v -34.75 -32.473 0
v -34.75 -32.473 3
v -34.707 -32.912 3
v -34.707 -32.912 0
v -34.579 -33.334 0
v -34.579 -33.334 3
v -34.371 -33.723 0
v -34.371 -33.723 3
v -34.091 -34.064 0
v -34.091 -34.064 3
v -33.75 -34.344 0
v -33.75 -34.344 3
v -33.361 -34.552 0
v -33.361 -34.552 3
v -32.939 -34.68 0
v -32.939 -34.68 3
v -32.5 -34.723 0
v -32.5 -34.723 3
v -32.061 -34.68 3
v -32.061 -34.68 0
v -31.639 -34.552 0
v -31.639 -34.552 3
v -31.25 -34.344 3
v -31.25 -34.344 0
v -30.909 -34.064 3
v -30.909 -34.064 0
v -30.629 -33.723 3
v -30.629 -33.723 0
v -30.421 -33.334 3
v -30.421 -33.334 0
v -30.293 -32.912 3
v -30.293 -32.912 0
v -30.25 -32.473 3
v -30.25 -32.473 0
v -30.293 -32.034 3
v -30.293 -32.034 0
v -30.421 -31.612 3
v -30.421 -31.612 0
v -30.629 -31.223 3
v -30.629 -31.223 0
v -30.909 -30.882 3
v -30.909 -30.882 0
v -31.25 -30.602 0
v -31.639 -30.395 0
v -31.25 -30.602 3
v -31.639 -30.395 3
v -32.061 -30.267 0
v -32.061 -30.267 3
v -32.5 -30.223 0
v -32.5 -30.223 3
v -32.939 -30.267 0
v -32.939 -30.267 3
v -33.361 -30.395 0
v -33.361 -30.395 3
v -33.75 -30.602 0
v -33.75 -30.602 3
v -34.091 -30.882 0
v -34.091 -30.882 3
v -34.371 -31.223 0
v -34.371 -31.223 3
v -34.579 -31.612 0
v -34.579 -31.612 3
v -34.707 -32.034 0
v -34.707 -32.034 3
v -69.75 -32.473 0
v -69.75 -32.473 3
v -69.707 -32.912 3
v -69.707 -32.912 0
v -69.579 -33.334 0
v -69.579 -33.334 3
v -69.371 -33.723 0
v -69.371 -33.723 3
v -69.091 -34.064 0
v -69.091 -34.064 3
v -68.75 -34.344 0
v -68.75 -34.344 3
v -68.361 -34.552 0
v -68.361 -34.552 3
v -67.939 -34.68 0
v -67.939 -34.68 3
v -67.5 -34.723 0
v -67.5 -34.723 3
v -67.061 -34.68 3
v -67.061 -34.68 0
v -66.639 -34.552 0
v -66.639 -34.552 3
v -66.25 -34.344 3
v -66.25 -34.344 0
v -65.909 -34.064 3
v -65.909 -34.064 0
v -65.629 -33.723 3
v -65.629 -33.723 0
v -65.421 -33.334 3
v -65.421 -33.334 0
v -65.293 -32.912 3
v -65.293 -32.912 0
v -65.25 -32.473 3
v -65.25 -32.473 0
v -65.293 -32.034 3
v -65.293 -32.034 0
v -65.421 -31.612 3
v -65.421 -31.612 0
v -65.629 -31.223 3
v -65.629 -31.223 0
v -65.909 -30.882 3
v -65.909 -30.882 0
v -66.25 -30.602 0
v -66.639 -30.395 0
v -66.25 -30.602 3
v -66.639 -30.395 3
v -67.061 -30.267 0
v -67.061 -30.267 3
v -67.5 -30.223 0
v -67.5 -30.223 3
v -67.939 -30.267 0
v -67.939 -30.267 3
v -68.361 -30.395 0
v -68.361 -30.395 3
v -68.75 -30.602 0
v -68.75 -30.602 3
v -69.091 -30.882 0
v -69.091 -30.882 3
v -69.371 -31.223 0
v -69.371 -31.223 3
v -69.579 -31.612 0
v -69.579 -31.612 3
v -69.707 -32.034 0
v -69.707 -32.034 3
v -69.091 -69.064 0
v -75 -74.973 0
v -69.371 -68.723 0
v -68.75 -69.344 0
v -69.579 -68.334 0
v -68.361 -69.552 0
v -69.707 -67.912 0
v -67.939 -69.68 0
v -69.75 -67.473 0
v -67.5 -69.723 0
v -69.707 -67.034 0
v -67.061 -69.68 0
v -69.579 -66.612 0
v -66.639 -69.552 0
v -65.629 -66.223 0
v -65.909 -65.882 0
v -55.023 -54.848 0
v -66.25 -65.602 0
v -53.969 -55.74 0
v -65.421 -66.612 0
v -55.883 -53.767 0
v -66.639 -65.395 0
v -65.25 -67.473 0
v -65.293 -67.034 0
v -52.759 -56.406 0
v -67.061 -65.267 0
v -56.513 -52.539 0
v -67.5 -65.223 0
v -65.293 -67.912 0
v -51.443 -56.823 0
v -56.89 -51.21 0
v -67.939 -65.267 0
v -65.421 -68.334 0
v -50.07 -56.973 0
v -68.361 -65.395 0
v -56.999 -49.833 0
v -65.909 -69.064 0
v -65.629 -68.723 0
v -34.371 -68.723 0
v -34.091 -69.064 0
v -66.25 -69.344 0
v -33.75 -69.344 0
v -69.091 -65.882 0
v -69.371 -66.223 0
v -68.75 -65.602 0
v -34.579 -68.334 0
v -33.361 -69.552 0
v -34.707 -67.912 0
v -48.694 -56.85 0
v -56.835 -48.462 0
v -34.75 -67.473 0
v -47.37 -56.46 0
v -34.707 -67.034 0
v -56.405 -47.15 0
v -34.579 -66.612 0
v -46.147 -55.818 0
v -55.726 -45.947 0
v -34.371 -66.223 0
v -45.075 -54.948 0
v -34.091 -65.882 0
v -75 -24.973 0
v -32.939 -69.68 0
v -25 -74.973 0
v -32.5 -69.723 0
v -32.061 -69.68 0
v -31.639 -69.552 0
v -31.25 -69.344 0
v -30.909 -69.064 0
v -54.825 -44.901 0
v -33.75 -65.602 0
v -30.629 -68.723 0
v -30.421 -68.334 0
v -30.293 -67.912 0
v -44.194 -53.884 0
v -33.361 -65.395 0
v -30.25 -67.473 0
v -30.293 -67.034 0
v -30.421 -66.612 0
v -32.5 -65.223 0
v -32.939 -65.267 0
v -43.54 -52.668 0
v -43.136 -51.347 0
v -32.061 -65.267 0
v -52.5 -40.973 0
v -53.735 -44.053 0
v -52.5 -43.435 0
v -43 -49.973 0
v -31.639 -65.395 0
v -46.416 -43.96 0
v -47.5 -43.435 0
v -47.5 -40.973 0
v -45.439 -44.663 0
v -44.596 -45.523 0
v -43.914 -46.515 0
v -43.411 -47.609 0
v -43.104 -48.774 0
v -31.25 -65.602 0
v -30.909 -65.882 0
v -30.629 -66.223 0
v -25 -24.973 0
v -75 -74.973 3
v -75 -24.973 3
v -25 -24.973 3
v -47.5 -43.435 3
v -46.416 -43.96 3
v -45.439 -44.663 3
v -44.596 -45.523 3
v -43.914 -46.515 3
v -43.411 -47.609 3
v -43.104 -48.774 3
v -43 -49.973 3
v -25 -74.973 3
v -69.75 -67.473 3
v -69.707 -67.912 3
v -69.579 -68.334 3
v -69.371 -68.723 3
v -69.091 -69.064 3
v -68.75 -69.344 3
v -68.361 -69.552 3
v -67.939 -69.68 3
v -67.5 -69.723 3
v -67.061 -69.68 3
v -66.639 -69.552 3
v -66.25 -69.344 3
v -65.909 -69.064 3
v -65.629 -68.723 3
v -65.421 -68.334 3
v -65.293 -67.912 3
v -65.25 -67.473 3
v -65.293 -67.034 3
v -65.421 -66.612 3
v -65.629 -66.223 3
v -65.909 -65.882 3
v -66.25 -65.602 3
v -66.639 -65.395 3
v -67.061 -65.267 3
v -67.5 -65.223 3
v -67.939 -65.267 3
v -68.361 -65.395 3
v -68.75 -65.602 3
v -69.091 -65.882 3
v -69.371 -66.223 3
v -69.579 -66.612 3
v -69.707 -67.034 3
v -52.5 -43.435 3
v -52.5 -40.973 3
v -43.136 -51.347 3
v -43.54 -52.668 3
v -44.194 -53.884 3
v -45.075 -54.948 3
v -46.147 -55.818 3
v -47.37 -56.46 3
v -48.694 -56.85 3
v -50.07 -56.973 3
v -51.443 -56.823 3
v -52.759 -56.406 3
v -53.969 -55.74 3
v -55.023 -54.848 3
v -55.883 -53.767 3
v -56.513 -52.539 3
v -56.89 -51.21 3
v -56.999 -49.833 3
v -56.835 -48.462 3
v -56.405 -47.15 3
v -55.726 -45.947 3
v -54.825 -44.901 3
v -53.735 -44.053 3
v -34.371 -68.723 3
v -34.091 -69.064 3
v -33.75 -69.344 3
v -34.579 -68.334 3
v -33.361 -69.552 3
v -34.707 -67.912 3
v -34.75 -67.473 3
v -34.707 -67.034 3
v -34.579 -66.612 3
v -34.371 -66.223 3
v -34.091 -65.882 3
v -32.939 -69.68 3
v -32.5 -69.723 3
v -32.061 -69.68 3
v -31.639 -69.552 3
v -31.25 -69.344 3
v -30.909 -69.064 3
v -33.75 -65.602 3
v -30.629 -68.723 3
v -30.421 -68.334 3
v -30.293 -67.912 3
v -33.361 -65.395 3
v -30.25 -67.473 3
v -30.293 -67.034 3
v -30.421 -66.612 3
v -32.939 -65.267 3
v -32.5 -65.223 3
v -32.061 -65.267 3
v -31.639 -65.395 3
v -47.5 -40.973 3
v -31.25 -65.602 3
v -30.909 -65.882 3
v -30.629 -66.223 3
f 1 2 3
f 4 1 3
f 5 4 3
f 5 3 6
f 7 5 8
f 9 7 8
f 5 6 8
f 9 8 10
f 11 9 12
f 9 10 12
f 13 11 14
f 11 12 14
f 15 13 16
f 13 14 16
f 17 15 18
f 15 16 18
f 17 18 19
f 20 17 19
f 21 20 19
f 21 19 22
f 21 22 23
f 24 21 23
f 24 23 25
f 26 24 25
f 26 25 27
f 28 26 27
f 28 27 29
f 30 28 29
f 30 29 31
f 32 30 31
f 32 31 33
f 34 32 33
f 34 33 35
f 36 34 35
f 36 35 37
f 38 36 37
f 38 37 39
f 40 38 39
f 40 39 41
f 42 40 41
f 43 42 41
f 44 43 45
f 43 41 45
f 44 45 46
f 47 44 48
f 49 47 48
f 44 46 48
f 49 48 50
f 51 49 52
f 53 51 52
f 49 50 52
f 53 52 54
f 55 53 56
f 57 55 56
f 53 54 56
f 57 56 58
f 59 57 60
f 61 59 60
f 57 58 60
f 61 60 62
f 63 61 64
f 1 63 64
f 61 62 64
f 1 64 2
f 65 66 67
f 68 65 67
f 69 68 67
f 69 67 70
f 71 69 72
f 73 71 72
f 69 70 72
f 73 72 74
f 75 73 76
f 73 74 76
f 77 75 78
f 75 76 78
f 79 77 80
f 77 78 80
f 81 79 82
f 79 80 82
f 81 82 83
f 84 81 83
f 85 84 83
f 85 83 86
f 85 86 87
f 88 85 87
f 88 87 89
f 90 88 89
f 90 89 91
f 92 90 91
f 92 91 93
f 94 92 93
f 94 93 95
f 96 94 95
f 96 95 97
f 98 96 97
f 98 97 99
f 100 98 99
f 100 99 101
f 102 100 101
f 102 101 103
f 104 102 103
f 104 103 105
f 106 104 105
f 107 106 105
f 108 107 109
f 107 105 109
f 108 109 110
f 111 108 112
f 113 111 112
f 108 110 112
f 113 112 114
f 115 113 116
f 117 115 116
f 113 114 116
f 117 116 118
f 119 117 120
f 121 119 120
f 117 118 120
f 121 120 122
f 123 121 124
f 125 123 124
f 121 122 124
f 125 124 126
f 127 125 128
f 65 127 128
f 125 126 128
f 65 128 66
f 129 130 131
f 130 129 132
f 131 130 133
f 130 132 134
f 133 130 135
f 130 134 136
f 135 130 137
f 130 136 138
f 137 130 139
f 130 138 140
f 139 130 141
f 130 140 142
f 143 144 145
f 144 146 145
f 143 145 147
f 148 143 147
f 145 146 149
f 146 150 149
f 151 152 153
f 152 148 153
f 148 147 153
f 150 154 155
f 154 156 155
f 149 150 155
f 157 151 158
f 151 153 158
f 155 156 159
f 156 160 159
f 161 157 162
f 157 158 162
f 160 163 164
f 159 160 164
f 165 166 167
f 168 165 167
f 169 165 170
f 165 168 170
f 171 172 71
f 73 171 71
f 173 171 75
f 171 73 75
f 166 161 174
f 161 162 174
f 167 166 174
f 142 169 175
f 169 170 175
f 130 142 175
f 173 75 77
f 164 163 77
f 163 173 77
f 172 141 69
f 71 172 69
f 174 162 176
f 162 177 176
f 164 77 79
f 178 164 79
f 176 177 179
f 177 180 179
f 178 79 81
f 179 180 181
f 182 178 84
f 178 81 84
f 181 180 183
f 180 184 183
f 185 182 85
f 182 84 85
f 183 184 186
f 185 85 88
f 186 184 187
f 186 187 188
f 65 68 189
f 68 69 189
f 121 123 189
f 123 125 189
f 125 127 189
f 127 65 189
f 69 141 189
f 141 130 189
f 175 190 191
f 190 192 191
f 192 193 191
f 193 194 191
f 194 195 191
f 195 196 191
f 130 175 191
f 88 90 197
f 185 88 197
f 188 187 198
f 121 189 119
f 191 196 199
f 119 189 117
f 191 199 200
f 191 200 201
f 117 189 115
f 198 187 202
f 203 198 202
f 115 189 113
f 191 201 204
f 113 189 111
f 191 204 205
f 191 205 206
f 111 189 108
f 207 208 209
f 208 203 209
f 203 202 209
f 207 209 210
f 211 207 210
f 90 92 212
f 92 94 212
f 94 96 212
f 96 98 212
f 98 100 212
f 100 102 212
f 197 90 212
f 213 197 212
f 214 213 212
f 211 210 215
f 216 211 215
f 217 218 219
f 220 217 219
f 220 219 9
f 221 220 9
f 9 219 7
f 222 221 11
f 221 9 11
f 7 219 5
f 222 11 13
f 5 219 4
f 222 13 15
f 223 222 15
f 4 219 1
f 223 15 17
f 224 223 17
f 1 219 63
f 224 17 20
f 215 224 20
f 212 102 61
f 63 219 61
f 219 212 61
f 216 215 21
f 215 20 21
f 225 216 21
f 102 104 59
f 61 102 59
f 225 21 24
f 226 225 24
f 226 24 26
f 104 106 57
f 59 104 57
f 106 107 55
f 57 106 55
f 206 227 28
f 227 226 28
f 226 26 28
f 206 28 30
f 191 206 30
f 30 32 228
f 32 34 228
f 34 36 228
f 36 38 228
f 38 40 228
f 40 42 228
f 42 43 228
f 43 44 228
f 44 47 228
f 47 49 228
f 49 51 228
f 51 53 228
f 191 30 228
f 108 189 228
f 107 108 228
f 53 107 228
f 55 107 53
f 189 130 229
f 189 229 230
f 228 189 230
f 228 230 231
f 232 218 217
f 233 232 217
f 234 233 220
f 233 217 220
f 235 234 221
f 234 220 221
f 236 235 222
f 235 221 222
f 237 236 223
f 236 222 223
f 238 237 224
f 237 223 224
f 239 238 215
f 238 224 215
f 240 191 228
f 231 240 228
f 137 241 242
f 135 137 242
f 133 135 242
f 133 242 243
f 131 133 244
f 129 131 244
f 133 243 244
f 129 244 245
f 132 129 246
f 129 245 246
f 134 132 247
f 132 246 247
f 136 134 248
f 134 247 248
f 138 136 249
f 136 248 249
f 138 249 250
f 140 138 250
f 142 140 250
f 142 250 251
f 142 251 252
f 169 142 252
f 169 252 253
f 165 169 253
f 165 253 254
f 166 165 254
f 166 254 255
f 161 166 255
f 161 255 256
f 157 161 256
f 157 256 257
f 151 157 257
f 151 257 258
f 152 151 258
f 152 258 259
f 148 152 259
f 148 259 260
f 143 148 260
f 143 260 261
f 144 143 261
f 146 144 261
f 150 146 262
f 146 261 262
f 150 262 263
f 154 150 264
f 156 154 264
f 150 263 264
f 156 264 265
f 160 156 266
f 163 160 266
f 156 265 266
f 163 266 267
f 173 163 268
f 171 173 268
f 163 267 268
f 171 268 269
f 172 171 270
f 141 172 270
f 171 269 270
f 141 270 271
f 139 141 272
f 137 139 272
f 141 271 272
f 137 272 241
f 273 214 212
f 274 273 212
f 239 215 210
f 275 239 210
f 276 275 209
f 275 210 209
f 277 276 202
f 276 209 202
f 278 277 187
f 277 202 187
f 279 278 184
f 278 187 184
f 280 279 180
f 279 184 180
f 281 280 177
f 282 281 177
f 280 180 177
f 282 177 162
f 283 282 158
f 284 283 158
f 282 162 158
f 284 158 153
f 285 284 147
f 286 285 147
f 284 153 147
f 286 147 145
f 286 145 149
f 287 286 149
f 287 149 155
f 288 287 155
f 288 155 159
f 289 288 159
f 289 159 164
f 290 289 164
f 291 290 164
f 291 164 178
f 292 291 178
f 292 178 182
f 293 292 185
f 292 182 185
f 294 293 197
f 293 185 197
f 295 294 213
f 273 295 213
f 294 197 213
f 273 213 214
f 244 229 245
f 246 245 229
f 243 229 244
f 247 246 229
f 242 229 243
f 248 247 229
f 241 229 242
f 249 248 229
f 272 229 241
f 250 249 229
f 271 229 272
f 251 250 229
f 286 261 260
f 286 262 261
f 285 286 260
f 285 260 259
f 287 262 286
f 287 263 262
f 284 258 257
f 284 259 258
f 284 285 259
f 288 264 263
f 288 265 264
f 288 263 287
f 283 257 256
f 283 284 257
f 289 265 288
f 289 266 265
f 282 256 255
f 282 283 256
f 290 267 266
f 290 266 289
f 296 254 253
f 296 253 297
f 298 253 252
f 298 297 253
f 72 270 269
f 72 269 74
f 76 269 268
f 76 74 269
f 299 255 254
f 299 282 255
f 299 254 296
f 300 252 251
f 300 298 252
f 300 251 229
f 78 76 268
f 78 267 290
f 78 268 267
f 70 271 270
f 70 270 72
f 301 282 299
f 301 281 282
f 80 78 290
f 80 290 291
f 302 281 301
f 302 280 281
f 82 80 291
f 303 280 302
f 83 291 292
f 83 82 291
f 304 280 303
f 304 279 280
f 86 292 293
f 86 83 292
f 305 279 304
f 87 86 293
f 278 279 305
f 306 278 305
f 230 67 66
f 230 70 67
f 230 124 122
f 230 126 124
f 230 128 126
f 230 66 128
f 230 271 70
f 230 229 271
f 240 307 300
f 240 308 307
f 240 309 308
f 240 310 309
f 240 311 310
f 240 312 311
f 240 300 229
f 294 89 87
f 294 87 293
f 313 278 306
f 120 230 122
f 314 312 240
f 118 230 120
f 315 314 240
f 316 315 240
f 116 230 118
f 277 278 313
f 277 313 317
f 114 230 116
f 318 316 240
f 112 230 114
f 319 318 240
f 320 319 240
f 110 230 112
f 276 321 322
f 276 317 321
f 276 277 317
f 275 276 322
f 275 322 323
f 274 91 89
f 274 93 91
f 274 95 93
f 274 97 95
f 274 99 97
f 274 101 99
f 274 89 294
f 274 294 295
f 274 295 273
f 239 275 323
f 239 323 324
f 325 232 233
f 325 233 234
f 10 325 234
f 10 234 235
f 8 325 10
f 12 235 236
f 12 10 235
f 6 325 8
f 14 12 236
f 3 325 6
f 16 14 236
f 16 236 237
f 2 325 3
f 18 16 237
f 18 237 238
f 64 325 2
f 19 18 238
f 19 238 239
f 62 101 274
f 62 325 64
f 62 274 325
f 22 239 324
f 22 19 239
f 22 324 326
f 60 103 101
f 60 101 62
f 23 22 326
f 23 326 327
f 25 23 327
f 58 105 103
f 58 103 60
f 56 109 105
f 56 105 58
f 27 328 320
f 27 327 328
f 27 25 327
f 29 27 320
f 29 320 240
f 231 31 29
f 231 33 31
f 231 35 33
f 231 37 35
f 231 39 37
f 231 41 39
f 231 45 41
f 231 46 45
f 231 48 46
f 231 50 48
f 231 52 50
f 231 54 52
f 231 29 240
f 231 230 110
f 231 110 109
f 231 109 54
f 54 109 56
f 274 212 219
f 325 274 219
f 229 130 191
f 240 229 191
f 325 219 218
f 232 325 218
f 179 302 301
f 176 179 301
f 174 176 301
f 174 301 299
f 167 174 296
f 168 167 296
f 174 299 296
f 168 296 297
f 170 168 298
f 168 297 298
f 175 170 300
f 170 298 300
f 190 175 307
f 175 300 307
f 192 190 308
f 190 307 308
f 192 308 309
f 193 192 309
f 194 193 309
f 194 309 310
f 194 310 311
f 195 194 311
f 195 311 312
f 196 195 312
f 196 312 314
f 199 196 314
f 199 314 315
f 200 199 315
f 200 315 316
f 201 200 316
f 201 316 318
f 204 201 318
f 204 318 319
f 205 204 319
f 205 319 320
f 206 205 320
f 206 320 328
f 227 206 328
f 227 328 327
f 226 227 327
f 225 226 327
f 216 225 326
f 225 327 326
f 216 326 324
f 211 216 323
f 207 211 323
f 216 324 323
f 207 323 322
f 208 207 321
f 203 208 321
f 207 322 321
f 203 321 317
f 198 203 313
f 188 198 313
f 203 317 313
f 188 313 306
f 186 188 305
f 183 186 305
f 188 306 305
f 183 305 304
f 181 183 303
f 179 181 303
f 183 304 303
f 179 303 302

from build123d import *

# Parameters (mm, degrees)
F0_W     = 50
F0_H     = 50
F0_R     = 2
F1_DEPTH = 3
F2_D     = 4.5


# Not quite as in the source:
# - a feature names something its author has since deleted; it is built from what else it names


with BuildPart() as f1:
    # F0 (on Top) → F1 (new body)
    with BuildSketch(Plane.XY):
        with Locations((-50, -49.9732751399)):
            Rectangle(F0_W, F0_H)
        with Locations((-67.5, -67.4732751399)):
            Circle(F0_R, mode=Mode.SUBTRACT)
        with Locations((-32.5, -67.4732751399)):
            Circle(F0_R, mode=Mode.SUBTRACT)
        with Locations((-67.5, -32.4732751399)):
            Circle(F0_R, mode=Mode.SUBTRACT)
        with BuildLine():
            Line((-47.5, -40.9732751399), (-47.5, -43.4349267246))
            ThreePointArc((-47.5, -43.4349267246), (-44.2337187027, -46.0046481733), (-43, -49.9732751399))
            ThreePointArc((-43, -49.9732751399), (-53.9686269666, -55.7395564373), (-52.5, -43.4349267246))
            Line((-52.5, -43.4349267246), (-52.5, -40.9732751399))
            Line((-52.5, -40.9732751399), (-47.5, -40.9732751399))
        make_face(mode=Mode.SUBTRACT)
        with Locations((-32.5, -32.4732751399)):
            Circle(F0_R, mode=Mode.SUBTRACT)
    extrude(amount=F1_DEPTH)

    # F2 (through all)
    with Locations(Plane(origin=(0, 0, 0), x_dir=(1, 0, 0), z_dir=(0, 0, -1))):
        with Locations((-32.5, 32.4732751399), (-32.5, 67.4732751399), (-67.5, 67.4732751399), (-67.5, 32.4732751399)):
            Hole(F2_D / 2)


solid = f1.part
